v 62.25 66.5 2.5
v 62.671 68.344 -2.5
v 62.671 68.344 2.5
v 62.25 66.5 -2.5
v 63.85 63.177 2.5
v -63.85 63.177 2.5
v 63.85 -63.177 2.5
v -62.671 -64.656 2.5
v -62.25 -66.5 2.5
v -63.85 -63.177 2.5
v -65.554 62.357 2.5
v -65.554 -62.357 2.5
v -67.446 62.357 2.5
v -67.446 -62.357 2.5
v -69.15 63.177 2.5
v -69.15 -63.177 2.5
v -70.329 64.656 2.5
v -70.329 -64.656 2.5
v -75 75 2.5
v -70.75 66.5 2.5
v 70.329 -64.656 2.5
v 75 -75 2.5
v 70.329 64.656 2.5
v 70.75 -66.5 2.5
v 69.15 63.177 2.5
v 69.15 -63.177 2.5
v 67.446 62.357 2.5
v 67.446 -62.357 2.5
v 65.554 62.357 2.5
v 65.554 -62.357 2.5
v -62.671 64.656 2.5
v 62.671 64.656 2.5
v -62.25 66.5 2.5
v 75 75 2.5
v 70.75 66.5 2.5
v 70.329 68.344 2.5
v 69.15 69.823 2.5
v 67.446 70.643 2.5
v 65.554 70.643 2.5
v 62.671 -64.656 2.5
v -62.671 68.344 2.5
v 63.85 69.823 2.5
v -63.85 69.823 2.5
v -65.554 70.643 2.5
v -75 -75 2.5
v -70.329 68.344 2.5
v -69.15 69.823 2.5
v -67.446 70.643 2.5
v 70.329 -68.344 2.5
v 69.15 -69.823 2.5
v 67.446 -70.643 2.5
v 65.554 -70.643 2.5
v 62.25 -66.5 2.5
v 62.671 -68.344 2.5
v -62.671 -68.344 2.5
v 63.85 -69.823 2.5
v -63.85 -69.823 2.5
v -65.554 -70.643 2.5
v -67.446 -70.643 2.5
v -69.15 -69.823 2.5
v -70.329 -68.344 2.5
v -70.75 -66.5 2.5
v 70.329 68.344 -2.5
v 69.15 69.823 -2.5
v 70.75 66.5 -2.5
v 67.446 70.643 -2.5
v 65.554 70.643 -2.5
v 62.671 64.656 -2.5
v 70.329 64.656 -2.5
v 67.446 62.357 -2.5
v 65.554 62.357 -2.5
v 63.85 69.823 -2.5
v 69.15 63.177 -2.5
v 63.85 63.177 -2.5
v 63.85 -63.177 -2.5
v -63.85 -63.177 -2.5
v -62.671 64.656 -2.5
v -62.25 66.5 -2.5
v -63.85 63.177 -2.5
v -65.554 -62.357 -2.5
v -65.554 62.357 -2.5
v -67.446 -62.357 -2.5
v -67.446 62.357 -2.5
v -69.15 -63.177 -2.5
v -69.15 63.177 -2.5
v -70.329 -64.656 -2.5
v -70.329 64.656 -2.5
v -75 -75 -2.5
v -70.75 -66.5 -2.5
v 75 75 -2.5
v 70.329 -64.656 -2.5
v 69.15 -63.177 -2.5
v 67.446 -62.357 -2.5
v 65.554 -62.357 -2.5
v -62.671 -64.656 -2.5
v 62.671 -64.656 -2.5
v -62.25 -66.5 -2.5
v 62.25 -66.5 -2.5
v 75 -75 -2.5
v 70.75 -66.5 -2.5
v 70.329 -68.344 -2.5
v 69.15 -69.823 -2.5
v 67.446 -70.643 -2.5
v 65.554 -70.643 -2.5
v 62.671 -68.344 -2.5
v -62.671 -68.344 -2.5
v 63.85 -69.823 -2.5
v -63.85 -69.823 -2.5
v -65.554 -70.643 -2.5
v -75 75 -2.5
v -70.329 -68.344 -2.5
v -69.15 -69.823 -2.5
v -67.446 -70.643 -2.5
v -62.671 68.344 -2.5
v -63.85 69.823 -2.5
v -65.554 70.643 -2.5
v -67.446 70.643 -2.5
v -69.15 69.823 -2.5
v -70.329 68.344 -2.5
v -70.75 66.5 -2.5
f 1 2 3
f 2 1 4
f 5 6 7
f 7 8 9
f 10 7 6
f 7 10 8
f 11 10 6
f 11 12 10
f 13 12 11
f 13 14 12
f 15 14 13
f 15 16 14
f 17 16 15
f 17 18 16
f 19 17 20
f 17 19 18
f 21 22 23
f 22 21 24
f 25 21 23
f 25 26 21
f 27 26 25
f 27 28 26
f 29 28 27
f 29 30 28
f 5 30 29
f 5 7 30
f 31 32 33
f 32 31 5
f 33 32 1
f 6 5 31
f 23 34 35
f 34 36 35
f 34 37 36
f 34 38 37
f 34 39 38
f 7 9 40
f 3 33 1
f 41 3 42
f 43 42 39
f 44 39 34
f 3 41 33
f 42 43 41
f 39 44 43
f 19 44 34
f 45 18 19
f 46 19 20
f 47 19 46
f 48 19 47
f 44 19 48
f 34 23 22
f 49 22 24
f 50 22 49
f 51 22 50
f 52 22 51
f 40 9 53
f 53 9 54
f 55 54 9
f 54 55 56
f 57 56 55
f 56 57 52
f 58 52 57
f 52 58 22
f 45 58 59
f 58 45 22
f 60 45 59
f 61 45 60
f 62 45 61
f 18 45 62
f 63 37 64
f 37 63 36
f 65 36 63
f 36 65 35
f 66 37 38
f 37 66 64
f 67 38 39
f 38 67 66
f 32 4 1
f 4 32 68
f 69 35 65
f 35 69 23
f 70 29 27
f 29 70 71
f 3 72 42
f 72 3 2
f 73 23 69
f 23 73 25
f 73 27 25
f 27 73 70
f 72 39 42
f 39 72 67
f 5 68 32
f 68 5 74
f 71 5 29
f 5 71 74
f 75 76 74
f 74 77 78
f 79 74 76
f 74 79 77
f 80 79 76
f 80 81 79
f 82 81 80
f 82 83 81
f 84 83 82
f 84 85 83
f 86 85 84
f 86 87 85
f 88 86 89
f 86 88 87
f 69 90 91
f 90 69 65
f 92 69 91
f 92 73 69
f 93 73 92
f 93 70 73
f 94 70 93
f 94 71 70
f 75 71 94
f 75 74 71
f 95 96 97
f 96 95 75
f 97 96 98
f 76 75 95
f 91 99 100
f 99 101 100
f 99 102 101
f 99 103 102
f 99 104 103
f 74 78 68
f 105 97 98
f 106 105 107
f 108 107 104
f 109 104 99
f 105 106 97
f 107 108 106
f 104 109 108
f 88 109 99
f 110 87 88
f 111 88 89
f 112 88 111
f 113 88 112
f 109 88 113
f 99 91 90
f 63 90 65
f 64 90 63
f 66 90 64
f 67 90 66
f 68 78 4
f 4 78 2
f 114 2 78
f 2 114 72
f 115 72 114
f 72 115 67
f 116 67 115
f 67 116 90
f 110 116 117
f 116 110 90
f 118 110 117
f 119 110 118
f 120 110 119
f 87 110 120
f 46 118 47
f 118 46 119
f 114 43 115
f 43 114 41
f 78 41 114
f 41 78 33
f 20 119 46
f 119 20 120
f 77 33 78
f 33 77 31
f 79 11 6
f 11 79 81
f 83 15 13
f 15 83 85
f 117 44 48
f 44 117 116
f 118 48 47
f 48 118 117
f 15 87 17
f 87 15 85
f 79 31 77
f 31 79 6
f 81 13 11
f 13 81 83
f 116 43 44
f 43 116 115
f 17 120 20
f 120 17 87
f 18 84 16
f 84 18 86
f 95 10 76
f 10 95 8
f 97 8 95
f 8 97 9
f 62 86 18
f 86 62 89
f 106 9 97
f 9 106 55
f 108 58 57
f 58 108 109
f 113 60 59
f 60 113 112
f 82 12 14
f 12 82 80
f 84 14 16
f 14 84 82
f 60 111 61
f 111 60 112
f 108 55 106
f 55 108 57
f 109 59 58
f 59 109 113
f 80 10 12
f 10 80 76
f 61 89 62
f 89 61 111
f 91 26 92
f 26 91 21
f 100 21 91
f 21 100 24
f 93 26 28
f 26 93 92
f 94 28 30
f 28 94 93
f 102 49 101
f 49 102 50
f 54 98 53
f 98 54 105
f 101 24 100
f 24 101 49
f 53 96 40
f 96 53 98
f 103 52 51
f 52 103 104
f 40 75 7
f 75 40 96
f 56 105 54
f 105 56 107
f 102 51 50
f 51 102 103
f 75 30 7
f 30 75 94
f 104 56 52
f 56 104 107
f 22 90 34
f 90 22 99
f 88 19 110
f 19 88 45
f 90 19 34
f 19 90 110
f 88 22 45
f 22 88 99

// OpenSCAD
// Generated by SolidPython 1.1.3 on 2024-07-25 13:19:41


difference() {
	cube(center = true, size = [150, 150, 5]);
	union() {
		translate(v = [66.5000000000, 66.5000000000]) {
			cylinder(center = true, h = 5, r = 4.2500000000);
		}
		translate(v = [-66.5000000000, 66.5000000000]) {
			cylinder(center = true, h = 5, r = 4.2500000000);
		}
		translate(v = [-66.5000000000, -66.5000000000]) {
			cylinder(center = true, h = 5, r = 4.2500000000);
		}
		translate(v = [66.5000000000, -66.5000000000]) {
			cylinder(center = true, h = 5, r = 4.2500000000);
		}
	}
}
/***********************************************
*********      SolidPython code:      **********
************************************************
 
import solid
import numpy as np
import numbers
import pudb
from solid.utils import *
import viewscad
import subprocess
import os
import os.path as osp
import math
import sys

chamfer_extrude=solid.import_scad("./chamfer_extrude.scad")
chamfer_extrude=chamfer_extrude.chamfer_extrude
r = viewscad.Renderer(width=800, height=800)

def debug(model,f_name,path="/home/ts/code/projects/mfd/designs/debug"):
    solid.scad_render_to_file(model,osp.join(path,f_name)+".scad")
#generate position list of wells using offset from center
wells_pos_from_center_4 = lambda offset: [[-offset,offset],
                                        [offset, offset],
                                        [-offset, -offset],
                                        [offset, -offset]]
wells_pos_from_center_2 = lambda offset: [[offset,0],
                                        [-offset,0]]

def make_well(dims,shape=None,height=None,dxf=False):
    def circle_cylinder():
        if dxf or (height is None):
            well = solid.circle(r=dims, segments=64)
        else:
            well = solid.cylinder(r=dims, h=height, segments=64, center = True)
        return well
    if dims is None:
        sys.exit("radius needs to be a number")
    if isinstance(dims, numbers.Number):
        well =circle_cylinder()
    elif len(dims)==1:
        if isinstance(dims[1], numbers.Number):
            well =circle_cylinder()
        else:
            sys.exit("radius needs to be a number")
    elif len(dims)==2:
        well = solid.square(dims,center = True)
    elif len(dims)==3:
        well = solid.cube(dims, center = True)
    return well

def wells_top_bottom(center_gap,device_dims=None,shape=None,height=None, positions = None, dxf = False,well_shape=None):
    if well_shape == None:
        well_shape = make_well(device_dims,shape=shape,height=height,dxf=dxf)
    wells = []
    if positions is None:
        offset = radius+radius/2.0
        positions = wells_pos_from_center_2(offset)
    if dxf or (height is None):
        height = 0
    for position in positions:
        if dxf:
            wells.append(solid.translate([position[0],position[1]])(well_shape))
        else:
            wells.append(solid.translate([position[0],position[1],height/2.0])(well_shape))
    return  union()(*wells)

#place wells in four corners 
def four_corner(radius,height=None, positions = None, dxf = False):
    #if well pos not specified set
    #to equally spaced by half radius
    if positions is None:
        offset = radius+radius/2.0
        positions = wells_pos_from_center_4(offset)
    if dxf or (height is None):
        height = 0
    #make wells at positions with specified radius and height
    wells = []
    for position in positions:
        #make circle if making dxf
        if dxf:
            well_shape = solid.circle(r=radius, segments=64)
            well_shape = solid.translate([position[0],position[1]])(well_shape)
        #if stl make cylinder
        else:
            well_shape = solid.cylinder(r=radius, h=height, segments=64, center = True)
            well_shape = solid.translate([position[0],position[1],height/2.0])(well_shape)
        wells.append(well_shape)
    return  union()(*wells)

#generate channels 
def make_channels(length,width,height=0,num_chans=1,max_chans=None,spacing=None, dxf = False,
                  rotate_channels=False):
    if dxf or (height is None):
        height = 0
    #if channel gap not defined, is equal to
    if spacing is None: spacing = width
    #calculate number of channels if fitting max num within given width
    if not max_chans is None:
        import math
        num_chans = math.floor((max_chans-spacing)/(width+spacing))
    #get total width of channel section  
    total_width = (width*num_chans)+(spacing*(num_chans-1))

    #make template channel
    #if rotate_channels: width, length = length, width
    if dxf:
        channel_t = solid.square([length,width],center = True)
    else:
        channel_t = solid.cube([length,width,height], center = True)

    #if number channels is even, offset the first channel to center its gap
    if num_chans % 2 == 0: centering = -(width/2.0+spacing/2.0)
    else: centering = 0
    #move template channel up to align bottom at z = 0 
    #and offset center if necessary
    if dxf:
        channel_t = solid.translate([0,centering])(channel_t)
    else:
        channel_t = solid.translate([0,centering,height/2.0])(channel_t)

    #if rotate_channels: length,width = width,length
    #start making the channels
    channels = []
    for i in range(num_chans):
        #if i=0 there is no translation
        #if i=1, we make the first channel adjacent to second
        direction = i

        #if i>=1, we add channels alternating left and right
        if i >= 1:
            direction = -(i/2.0)
            if i % 2 == 1: direction = (-direction)+0.5
                
        #make channel at right position and add it to channel list
        translation_coords = [0,direction*(width+spacing)]
        #if rotate_channels: translation_coords = [direction*(width+spacing),0]
        if dxf:
            channel = solid.translate(translation_coords)(channel_t)
        else:
            channel = solid.translate([*translation_coords,0])(channel_t)
        channels.append(channel)
    
    #group all channels as one object
    channels = union()(*channels)
    #compute the x,y,z dimensions in order to pass as arguments 
    #for construction of other parts of device (such as the chambers)
    measurements = {'x':(length/2.0,-length/2.0),
                    'y':(total_width/2.0,-total_width/2.0)}
    if not dxf:
        measurements['z'] = (height,0)
    if rotate_channels:
        channels = solid.rotate(90)(channels)
        measurements['x'],measurements['y']=measurements['y'],measurements['x']
    return channels,measurements

def make_chambers(msrs,height=None,extra=0,len_until=None,width=None, dxf = False):
    #computes x,y,z length
    total = lambda x : abs(x[0]) + abs(x[1])
    
    #if specific height if specified
    #otherwise use same height as channels
    if dxf:
        pass
    elif not height is None:
        msrs['z'] = (height,0)
    else:
        msrs['z'] = (0,0)
        
    #make copy of measurements from channels to modify chamber dimensions 
    #and add length to chambers as specified
    chamber_dims = msrs.copy()
    #calculate length of chamber to reach specified offset
    if not len_until is None:
        chamber_len = len_until-(msrs['x'][0])
    #or add specified length to channel length (if not specified, adds 0)
    else:
        chamber_len = msrs['x'][0]+extra
    #set the chamber length based 
    chamber_dims['x'] = (chamber_len/2.0,-(chamber_len/2.0))
    #compute final dimensions of chamber
    if not width is None:
        chamber_dims['y'] = (width/2.0,-width/2.0)
    chamber_dims = [total(size) for size in chamber_dims.values()]
        
    #calculate chamber translation offset to place adjacent to channels
    chamber_trslt = msrs['x'][0]+(chamber_len/2.0)
    #compute chamber translation coordinates to align with channels
    #x = 1 moves chamber above channels
    #x = -1 moves chamber below channels
    if dxf:
        trslt = lambda x : [x*(chamber_trslt),0]
    else:
        trslt = lambda x : [x*(chamber_trslt),0,msrs['z'][0]/2.0]
    
    #function to make chamber at top or at bottom 
    if dxf:
        move = lambda x : solid.translate(trslt(x))(solid.square(chamber_dims, center = True) )
    else:
        move = lambda x : solid.translate(trslt(x))(solid.cube(chamber_dims,center = True))
    #make top and bottom chambers and return them as grouped
    top = move(1)
    bottom = move(-1)
    #chambers=solid.rotate(90)(solid.union()(top,bottom))
    chambers=(solid.union()(top,bottom))

    return chambers

#create alignment features 
def alignment_features(unit,dims,grid_size, mask_size = None, alignment = "hollow", units_from_center = (2.5,2.5), corner_len=None):
    width = grid_size[0]*dims[0]
    length = grid_size[1]*dims[1]
    if mask_size is None and corner_len is None:
        corner_len = (dims[0] + dims[1]) /2 / 8
    corner = lambda thickness_div : solid.union()( solid.square([corner_len,corner_len/thickness_div],center=False), solid.square([corner_len/thickness_div,corner_len],center=False) )
    
    def make_full(thickness_div):
        thickness = corner_len/thickness_div
        tr = solid.translate([0, 0, 0 ])(solid.rotate(180)(corner(thickness_div)))
        tr = solid.translate([thickness/2,thickness/2,0])(tr)
        bl = solid.translate([0, 0, 0 ])(solid.rotate(0)(corner(thickness_div)))
        bl = solid.translate([-thickness/2,-thickness/2,0])(bl)
        return solid.union()(tr,bl)
    
    def make_hollow(thickness_div):
        thickness = corner_len/(thickness_div/2)
        inner = make_full(thickness_div)
        outer = make_full(thickness_div/2)
        hollow = outer - inner 
        return hollow
    
    center = (width /2 , length/2)
    mask_pos = lambda x,y : (center[0] + x*(float(units_from_center[0])*dims[0]), center[1] + y*(float(units_from_center[1])*dims[1]))
    positions = []
    positions.append(mask_pos(1,0))
    positions.append(mask_pos(0,1))
    positions.append(mask_pos(-1,0))
    positions.append(mask_pos(0,-1))
    make_mask = lambda mtype : make_hollow(8) if mtype == "hollow" else make_full(8)
    masks = [ solid.translate([*position,0])(make_mask(alignment)) for position in positions]
    
    solid.scad_render_to_file(solid.union()(*masks),"./designs/open_chamber/masks.scad")
    #return unit - solid.union()(*masks)
    return solid.union()(*masks,unit)

def create_outline(thickness, array, dims, grid_size,):
    width = grid_size[0]*dims[0] + thickness *2
    length = grid_size[1]*dims[1] + thickness *2
    outer = solid.translate([-thickness, -thickness,0])(solid.square([width, length]))
    return outer-array

def create_wall(wall_thickness, outline_thickness, dims, grid_size, wall_height = 2000, dxf = False):
    inner_width = grid_size[0]*dims[0] + outline_thickness *2
    inner_length = grid_size[1]*dims[1] + outline_thickness *2
    outer_width = inner_width + wall_thickness * 2
    outer_length = inner_length + wall_thickness * 2
    outer_pos_x = -outline_thickness-wall_thickness
    outer_pos_y = -outline_thickness-wall_thickness
    inner_pos_x = -outline_thickness
    inner_pos_y = -outline_thickness
    if dxf:
        inner_wall = solid.translate([inner_pos_x,
                                      inner_pos_y,
                                      0])(solid.square([inner_width, inner_length]))
        outer_wall = solid.translate([outer_pos_x,
                                      outer_pos_y,
                                      0])(solid.square([outer_width, outer_length]))

        return outer_wall-inner_wall
    else:
        inner_wall = solid.translate([inner_pos_x,
                                      inner_pos_y,
                                      0])(solid.cube([inner_width, inner_length,wall_height]))
        outer_wall = solid.translate([outer_pos_x,
                                      outer_pos_y,
                                      0])(solid.cube([outer_width, outer_length,wall_height]))

        return outer_wall-inner_wall, {'wall_height': wall_height,
                                       'wall_thickness': wall_thickness,
                                       'inner_width':inner_width,
                                       'inner_length': inner_length,
                                       'outer_width': outer_width,
                                       'outer_length': outer_length,
                                       'outer_pos_x' : outer_pos_x,
                                       'outer_pos_y' : outer_pos_y,
                                       'inner_pos_x' : inner_pos_x,
                                       'inner_pos_y' : inner_pos_y}

def create_thicker_wall(wall_thickness, outer_wall_offset, wall_dims, dims, grid_size, height_start = .2, height_end=2, dxf = False):
    addon_wall,thicker_wall_dims = create_wall(wall_thickness, outer_wall_offset, dims, grid_size, wall_height=height_end-height_start, dxf = False)
    addon_wall = solid.translate([0,0,height_start])(addon_wall)

    thicker_wall_dims['wall_height'] = height_end
    thicker_wall_dims['wall_thickness'] = wall_dims['wall_thickness'] + wall_thickness
    return addon_wall, thicker_wall_dims
 
def add_lock_to_wall(wall,wall_dims,y_offset = 0,cut_ratio=0.7,L_length=3, gap_ratio=0.05, axis="x",width_ratio=1/2):
    # Makes L shape
    def make_L(max_length,length_thickness,max_width,width_thickness,height,y_offset):
        length = solid.cube([max_length,length_thickness,height])
        width = solid.cube([width_thickness,max_width,height])
        width = solid.translate([max_length-(width_thickness),0,0])(width)
        L = solid.union()(width,length)
        debug(L,"L")
        if axis == "x":
            L = solid.rotate(-90)(L)
            L = solid.translate([0,max_length,0])(L)
        else:
            L = solid.rotate(-180)(L)
            L = solid.translate([max_length,max_width,0])(L)
        return solid.translate([0,0,y_offset])(L)
    
    lock_length = L_length
    lock_width = wall_dims['wall_thickness']*width_ratio
    lock_length_thickness = lock_width/2
    lock_width_thickness = lock_width/2
    L_lock = make_L(lock_length,lock_length_thickness,lock_width,lock_width_thickness, wall_dims['wall_height']-y_offset, y_offset)
    
    margin_space = lock_length - lock_length*(1-gap_ratio)
    key_length = lock_length-margin_space
    key_length_thickness = lock_length_thickness-(margin_space*2)
    key_width = lock_width-(margin_space*2)
    key_width_thickness = lock_width_thickness-(margin_space*2)
    L_key = make_L(key_length,key_length_thickness,key_width,key_width_thickness, wall_dims['wall_height']-y_offset, y_offset)
    L_key = solid.translate([margin_space,margin_space,0])(L_key)
    L = solid.union()(L_lock,L_key)
    debug(L,"L")
    
    #Make cube to be used as negative to split frame in a half
    #Can choose if making left or right negative, specify ratio of split
    def make_negative(right,cut_ratio):
        if axis == "x":
            if right:
                length = wall_dims['outer_length']*(1-cut_ratio)
                pos_x = wall_dims['outer_pos_x']+(wall_dims['outer_length']*cut_ratio)
            else:
                length = wall_dims['outer_length']*(cut_ratio)
                pos_x = wall_dims['outer_pos_x'] 
            negative = solid.cube([wall_dims['outer_width'],length, wall_dims['wall_height']])
            negative = solid.translate([wall_dims['outer_pos_y'],pos_x,0])(negative)
        else:
            if right:
                length = wall_dims['outer_width']*(1-cut_ratio)
                pos_x = wall_dims['outer_pos_y']+(wall_dims['outer_width']*cut_ratio)
            else:
                length = wall_dims['outer_width']*(cut_ratio)
                pos_x = wall_dims['outer_pos_y'] 
            negative = solid.cube([length,wall_dims['outer_length'], wall_dims['wall_height']])
            negative = solid.translate([pos_x,wall_dims['outer_pos_x'],0])(negative)
        return negative, pos_x, length 
                      
    #Make negatives
    negative_right, right_half_pos_x, right_half_length = make_negative(True,cut_ratio)
    negative_left, left_half_pos_x, right_half_length = make_negative(False,cut_ratio)
    #Make halves
    left_half = solid.difference()(wall,negative_right)
    right_half = solid.difference()(wall,negative_left)
    def place_L(L, L_length,L_width):
        #Place L on top wall       
        offset_to_center = (wall_dims['wall_thickness']-L_width)/2
        if axis == "x":
            y_pos_top = (wall_dims['outer_pos_y'] +
                    wall_dims['outer_width'] - 
                    L_width - offset_to_center)
            top_L = solid.translate([y_pos_top,
                                     right_half_pos_x-(L_length),
                                     0])(L)
            #Place L on bottom wall       
            y_pos_bottom = wall_dims['outer_pos_y']+offset_to_center
            bottom_L = solid.translate([y_pos_bottom,
                                        right_half_pos_x-L_length,
                                        0])(L)
        else:
            y_pos_top = (wall_dims['outer_pos_x'] +
                    wall_dims['outer_length'] -
                    (L_width+offset_to_center))
            top_L = solid.translate([right_half_pos_x-L_length,
                                     y_pos_top,
                                     0])(L)
            #Place L on bottom wall       
            y_pos_bottom = wall_dims['outer_pos_y']+offset_to_center
            bottom_L = solid.translate([right_half_pos_x-L_length,
                                        y_pos_bottom,
                                        0])(L)
        return bottom_L, top_L
    #Make complimentary L pieces through union and differences
    #Make Lock
    bottom_L_lock, top_L_lock = place_L(L_lock,L_length,lock_width)
    left_half = solid.difference()(left_half,bottom_L_lock)
    left_half = solid.difference()(left_half,top_L_lock)
    #Make Key
    bottom_L_key, top_L_key = place_L(L_key,L_length,lock_width)
    right_half = solid.union()(right_half,bottom_L_key)
    right_half = solid.union()(right_half,top_L_key)
    return left_half, right_half


#build a row x col grid of containment units
def make_unit_array(unit,dims,grid_size, dxf = False, alignment = None, mask_size = None,
                    units_from_center = None,alignment_offset=None, alignment_mark_size=1):
    units = []
    for col in range(grid_size[1]):
        for row in range(grid_size[0]):
            if dxf:
                units.append(solid.translate([row*dims[0],col*dims[1]])(unit))
            else:
                units.append(solid.translate([row*dims[0],col*dims[1],dims[2]/2.0])(unit))
    array = solid.union()(*units)
    if (not alignment is None) and dxf:
        if not alignment_offset is None:
            array = solid.translate([alignment_offset[0],alignment_offset[1]])(array)
        array = alignment_features(array,dims, grid_size, alignment = alignment, mask_size = None, units_from_center = units_from_center,corner_len=alignment_mark_size)
        if not alignment_offset is None:
            array = solid.translate([-alignment_offset[0],-alignment_offset[1]])(array)
    return array


def make_taylor(wells_pos = wells_pos_from_center_4(2.25), well_rad = 1.5 ,
                well_height = 2, chan_w = 0.01, chan_l = 1, chan_h = 0.010 ,
                chan_gap = 0.040, max_chans = None,num_chans=100, chamber_height  = 0.100,
                columns = 1, rows = 1, chamber_len_until=2.25, add_channels = True, add_wells = True, 
                add_chambers = True, save_path = "./", alignment = None, units_from_center = 2,
                mask_size = None, render_stl = False, outline_thickness = 0.050, dxf = True,
                wall_height = 15, wall_thickness = 0.95, casing_x=9, casing_y=9, casing_z=0,rotate_units=0):

    dims = [casing_x, casing_y, casing_z]
    wells = four_corner(well_rad,well_height, dxf = dxf, positions = wells_pos)
    debug(wells,"wells")
    channels, msrs = make_channels(chan_l,chan_w,chan_h,dxf=dxf, spacing = chan_gap, max_chans=max_chans,num_chans=num_chans)
    debug(channels,"channels")
    chambers = make_chambers(msrs,dxf = dxf, height=chamber_height,len_until=chamber_len_until)
    debug(chambers,"chambers")

    #add together and render
    device_parts = []
    if add_channels:
        device_parts.append(channels)
    if add_wells:
        device_parts.append(wells)
    if add_chambers:
        device_parts.append(chambers)
    device=union()(*device_parts)
    device = rotate(rotate_units)(device)

    device=solid.translate([dims[0]/2.0,dims[1]/2.0,0])(device)
    channels = rotate(rotate_units)(channels)
    channels=solid.translate([dims[0]/2,dims[1]/2,0])(channels)
    chambers_wells = union()(wells,chambers)
    chambers_wells = rotate(rotate_units)(chambers_wells)
    chambers_wells=solid.translate([dims[0]/2,dims[1]/2,0])(chambers_wells)

    file_name = str(rows)+'x'+str(columns)+'_units_'
    grid_size = [rows,columns]

    if alignment:
        alignment="full"
    device = make_unit_array(device,dims,grid_size, dxf=dxf, alignment = alignment,
                                 units_from_center = units_from_center)
    channels = make_unit_array(channels,dims,grid_size, dxf=dxf, alignment = alignment,
                                 units_from_center = units_from_center)
    if alignment=="full":
        alignment="hollow"

    chambers_wells = make_unit_array(chambers_wells,dims,grid_size, dxf=dxf, alignment = alignment,
                                 units_from_center =units_from_center)

    def save_model(model,prefix):
        model_fname = os.path.abspath(save_path+prefix+"_"+file_name+".scad")
        solid.scad_render_to_file(model,model_fname)
        return model_fname

    wells_fname = save_model(wells,"wells")
    channels_fname = save_model(channels,"channels")
    device_fname = save_model(device,"device")
    chambers_wells_fname = save_model(chambers_wells,"chambers_wells")
    return (chambers_wells,chambers_wells_fname), (channels,channels_fname), (device,device_fname)

def make_device(design='open',rows=8,columns=6,wells_pos = 4.5,well_offset=3.2, well_rad=3.2,well_height=0.1,
                chan_l=1,chan_w=0.01,chan_h=0.01,chan_gap=0.015,num_chans=101,dxf=True,save_path="./designs/open_chamber/",
                casing_x=9.0,casing_y=18.0,casing_z=0,rotate_units=90,units_from_center=(3,1),chamber_len_until=4.5,
                chamber_width=None,alignment=True, add_wells=True, add_channels=True,add_chambers=True,well_shape=None):

    dims = [casing_x, casing_y, casing_z]
    if design == "open":
        wells_pos=wells_pos_from_center_2(wells_pos)
        wells = wells_top_bottom(well_offset*2,device_dims=well_rad,height=well_height, dxf = dxf, positions = wells_pos,well_shape=well_shape)
    elif design == "closed":
        wells_pos=wells_pos_from_center_4(wells_pos)
        debug(wells,"wells")
        wells = four_corner(well_offset,well_height,device_dims=well_rad, dxf = dxf, positions = wells_pos)
    else:
        print(design+" is not a valid design.\n Choose valid design: 'open' or 'closed'")
        exit()
    wells = rotate(rotate_units)(wells)
    wells=solid.translate([dims[0]/2,dims[1]/2,0])(wells)
    debug(wells,"wells")

    channels, msrs = make_channels(chan_l,chan_w,chan_h,dxf=dxf, spacing = chan_gap, num_chans=num_chans,rotate_channels=False)
    channels = rotate(rotate_units)(channels)
    channels=solid.translate([dims[0]/2,dims[1]/2,0])(channels)

    chambers=make_chambers(msrs,height=None,extra=0,len_until=chamber_len_until, width=chamber_width,dxf = dxf)
    chambers = rotate(rotate_units)(chambers)
    chambers=solid.translate([dims[0]/2,dims[1]/2,0])(chambers)

    device_parts = []
    if add_channels:
        device_parts.append(channels)
    if add_wells:
        device_parts.append(wells)
    if add_chambers:
        device_parts.append(chambers)
    device = union()(*device_parts)
    #device = rotate(rotate_units)(device)
    #device=solid.translate([dims[0]/2.0,dims[1]/2.0,0])(device)

    chambers_wells = []
    if add_chambers:
        chambers_wells.append(chambers)
    if add_wells:
        chambers_wells.append(wells)
    chambers_wells = union()(*chambers_wells)
    #chambers_wells = union()(wells,chambers)
    #chambers_wells = rotate(rotate_units)(chambers_wells)
    #chambers_wells=solid.translate([dims[0]/2,dims[1]/2,0])(chambers_wells)

    file_name = str(rows)+'x'+str(columns)+'_units_'

    grid_size = [rows,columns]
    if alignment:
        alignment="full"
    device = make_unit_array(device,dims,grid_size, dxf=dxf, alignment = alignment,
                                 units_from_center = units_from_center)
    channels = make_unit_array(channels,dims,grid_size, dxf=dxf, alignment = alignment,
                                 units_from_center = units_from_center)
    if alignment=="full":
        alignment="hollow"

    chambers_wells = make_unit_array(chambers_wells,dims,grid_size, dxf=dxf, alignment = alignment,
                                 units_from_center =units_from_center)

    def save_model(model,prefix):
        model_fname = os.path.abspath(save_path+prefix+"_"+file_name+".scad")
        solid.scad_render_to_file(model,model_fname)
        return model_fname

    wells_fname = save_model(wells,"wells")
    channels_fname = save_model(channels,"channels")
    device_fname = save_model(device,"device")
    chambers_wells_fname = save_model(chambers_wells,"chambers_wells")
    return (chambers_wells,chambers_wells_fname), (channels,channels_fname), (device,device_fname)


def make_open_chamber(rows=8,columns=6,wells_pos = wells_pos_from_center_2(4.5), well_rad=3.2,well_height=0.1,
                      chan_l=1,chan_w=0.01,chan_h=0.01,chan_gap=0.015,num_chans=101,dxf=True,save_path="./designs/open_chamber/",
                      casing_x=9.0,casing_y=18.0,casing_z=0,rotate_units=90,units_from_center=(3,1),chamber_len_until=4.5,
                      chamber_width=None,alignment=True, add_wells=True, add_channels=True,add_chambers=True,well_shape=None):

    dims = [casing_x, casing_y, casing_z]
    wells = wells_top_bottom(well_rad,height=well_height, dxf = dxf, positions = wells_pos, well_shape=well_shape)
    channels, msrs = make_channels(chan_l,chan_w,chan_h,dxf=dxf, spacing = chan_gap, num_chans=num_chans,rotate_channels=False)
    chambers=make_chambers(msrs,height=None,extra=0,len_until=chamber_len_until, width=chamber_width,dxf = dxf)
    debug(chambers,"chambers")
    device_parts = []
    if add_channels:
        device_parts.append(channels)
    if add_wells:
        device_parts.append(wells)
    if add_chambers:
        device_parts.append(chambers)
    device = union()(*device_parts)
    device = rotate(rotate_units)(device)
    device=solid.translate([dims[0]/2.0,dims[1]/2.0,0])(device)
    channels = rotate(rotate_units)(channels)
    channels=solid.translate([dims[0]/2,dims[1]/2,0])(channels)
    chambers_wells = union()(wells,chambers)
    chambers_wells = rotate(rotate_units)(chambers_wells)
    chambers_wells=solid.translate([dims[0]/2,dims[1]/2,0])(chambers_wells)

    file_name = str(rows)+'x'+str(columns)+'_units_'

    grid_size = [rows,columns]
    if alignment:
        alignment="full"
    device = make_unit_array(device,dims,grid_size, dxf=dxf, alignment = alignment,
                                 units_from_center = units_from_center)
    channels = make_unit_array(channels,dims,grid_size, dxf=dxf, alignment = alignment,
                                 units_from_center = units_from_center)
    if alignment=="full":
        alignment="hollow"

    chambers_wells = make_unit_array(chambers_wells,dims,grid_size, dxf=dxf, alignment = alignment,
                                 units_from_center =units_from_center)

    def save_model(model,prefix):
        model_fname = os.path.abspath(save_path+prefix+"_"+file_name+".scad")
        solid.scad_render_to_file(model,model_fname)
        return model_fname

    wells_fname = save_model(wells,"wells")
    channels_fname = save_model(channels,"channels")
    device_fname = save_model(device,"device")
    chambers_wells_fname = save_model(chambers_wells,"chambers_wells")
    return (chambers_wells,chambers_wells_fname), (channels,channels_fname), (device,device_fname)

def to_dxf(scad_path):
    dxf_path = scad_path.replace(".scad",".dxf")
    subprocess.call(["openscad", "-o", dxf_path, scad_path])
    import ezdxf
    temp_dxf = ezdxf.readfile(dxf_path)
    temp_dxf.saveas(dxf_path)

#def make_walls(diameter,thickness,grid_size,dims,height=20,segments=256,make_inner=True):
#    wafer_wall_out = solid.cylinder(r=diameter/2,h=height, segments=segments)
#    wafer_wall_in = solid.cylinder(r=(diameter/2-thickness),h=height, segments=segments)
#    wafer_wall = solid.difference()(wafer_wall_out,wafer_wall_in)
#    wafer_wall = solid.translate([grid_size[1]*dims[1]/2.0,grid_size[0]*dims[0]/2.0])(wafer_wall)
#
#    vertical_wall_length = grid_size[1]*dims[1]
#    horizontal_wall_length = grid_size[0]*dims[0]
#    vertical_wall = solid.cube([vertical_wall_length,thickness,height],center = True)
#    vertical_wall = solid.translate([vertical_wall_length/2,0,height/2])(vertical_wall)
#    horizontal_wall = solid.cube([thickness,horizontal_wall_length,height],center = True)
#    horizontal_wall = solid.translate([0,vertical_wall_length/2,height/2])(horizontal_wall)
#    walls = []
#    walls.append(horizontal_wall)
#    walls.append(vertical_wall)
#    for col in range(grid_size[1]):
#        if col == grid_size[1]-1: 
#            walls.append(solid.translate([0,(col+1)*dims[1]])(vertical_wall))
#        elif col > 0 and col < grid_size[1]-1 and make_inner==True:
#            walls.append(solid.translate([0,(col+1)*dims[1]])(vertical_wall))
#    for row in range(grid_size[0]):
#        if row == grid_size[0]-1: 
#            walls.append(solid.translate([(row+1)*dims[0],0])(horizontal_wall))
#        elif row > 0 and row < grid_size[0]-1 and make_inner==True:
#            walls.append(solid.translate([(row+1)*dims[0],0])(horizontal_wall))
#    walls = union()(*walls)
#    wafer_walls = union()(walls,wafer_wall)
#    return walls,wafer_wall,wafer_walls

def make_walls(diameter,thickness,grid_size,dims,height=20,segments=256,make_inner=True,padx=0,pady=0):
    wafer_wall_out = solid.cylinder(r=diameter/2,h=height, segments=segments)
    wafer_wall_in = solid.cylinder(r=(diameter/2-thickness),h=height, segments=segments)
    wafer_wall = solid.difference()(wafer_wall_out,wafer_wall_in)
    wafer_wall = solid.translate([grid_size[1]*dims[1]/2.0,grid_size[0]*dims[0]/2.0])(wafer_wall)

    vertical_wall_length = grid_size[0]*dims[0]+padx
    horizontal_wall_length = grid_size[1]*dims[1]+pady
    vertical_wall = solid.cube([vertical_wall_length,thickness,height],center = True)
    vertical_wall = solid.translate([vertical_wall_length/2-pady/2,-padx/2,height/2])(vertical_wall)
    horizontal_wall = solid.cube([thickness,horizontal_wall_length,height],center = True)
    horizontal_wall = solid.translate([-pady/2,horizontal_wall_length/2-padx/2,height/2])(horizontal_wall)
    walls = []
    walls.append(horizontal_wall)
    walls.append(vertical_wall)
    for col in range(grid_size[1]):
        if col == grid_size[1]-1: 
            walls.append(solid.translate([0,(col+1)*dims[1]+pady])(vertical_wall))
        elif col > 0 and col < grid_size[1]-1 and make_inner==True:
            walls.append(solid.translate([0,(col+1)*dims[1]])(vertical_wall))
    for row in range(grid_size[0]):
        if row == grid_size[0]-1: 
            walls.append(solid.translate([(row+1)*dims[0]+padx,0])(horizontal_wall))
        elif row > 0 and row < grid_size[0]-1 and make_inner==True:
            walls.append(solid.translate([(row+1)*dims[0],0])(horizontal_wall))
    walls = union()(*walls)
    wafer_walls = union()(walls,wafer_wall)
    return walls,wafer_wall,wafer_walls

def save_model(model,base_path,base_name,dxf=True):
    if not os.path.exists(base_path):
        os.makedirs(base_path)
    dxf_path=osp.join(base_path,base_name+".scad")
    solid.scad_render_to_file(model,osp.join(dxf_path))
    if dxf:
        to_dxf(dxf_path)

def make_wafer(diameter,flat_len,thickness):
    wafer = solid.cylinder(r1=diameter/2,r2=diameter/2,h=thickness,segments=512,)()
    x_start_flat=(flat_len/2)
    y_start_flat = math.sqrt(((diameter/2)**2) - (x_start_flat**2) )
    height_delete_flat=diameter/2-y_start_flat
    flat_delete = solid.cube([flat_len,height_delete_flat,thickness],center=False)()
    flat_delete = solid.translate([-flat_len/2,y_start_flat,0])(flat_delete)
    wafer = solid.difference()(wafer,flat_delete)
    wafer = solid.rotate(90)(wafer)
    return wafer

def add_wafer_to_mask(wafer_size,flat_len,mask,grid_size,dims,wafer_line_thickness=0.1,outer_mask_thickness=5,alignment_offset=None,shrinkage_scale=1.0):
    def make_wafer_mask(wafer_size,flat_len):
        wafer_mask = make_wafer(wafer_size,flat_len,1)
        wafer_mask = solid.projection()(wafer_mask)
        wafer_mask = solid.translate(np.array([grid_size[0]*dims[0]/2.0,grid_size[1]*dims[1]/2.0])*shrinkage_scale)(wafer_mask)
        if not alignment_offset is None:
            wafer_mask = solid.translate(np.array([-alignment_offset[0],-alignment_offset[1]])*shrinkage_scale)(wafer_mask)
        return wafer_mask

    inner_wafer_line_mask = make_wafer_mask(wafer_size-wafer_line_thickness/2,flat_len)
    outer_wafer_line_mask = make_wafer_mask(wafer_size+wafer_line_thickness/2,flat_len)
    outer_wafer_mask = make_wafer_mask(wafer_size+outer_mask_thickness,flat_len)
    outer_wafer_mask = solid.difference()(outer_wafer_mask,outer_wafer_line_mask)
    wafer_mask = solid.union()(outer_wafer_mask,inner_wafer_line_mask)

    return solid.difference()(wafer_mask,mask)

def make_posts(post_shape,post_height):
    posts = solid.linear_extrude(height=post_height)(post_shape)
    return posts

def make_wafer_empty(diameter,flat_len,thickness,margin,notch_len=20,notch_height=5,oversize=1.01):
    diameter*=oversize
    flat_len*=oversize
    wafer = make_wafer(diameter,flat_len,thickness)
    holder = solid.cylinder(r1=diameter/2+margin,r2=diameter/2+margin,h=thickness,segments=512)()
    holder = solid.difference()(holder,wafer)

    x_start_flat=(flat_len/2)
    y_start_flat = math.sqrt(((diameter/2)**2) - (x_start_flat**2) )
    height_delete_flat=diameter/2-y_start_flat
    notch = solid.cube([notch_len,notch_height,thickness],center=False)()
    notch = solid.translate([-notch_len/2,y_start_flat,0])(notch)
    notch = solid.rotate(90)(notch)
    return solid.difference()(holder,notch)

def wafer_print_calibration(diameter,thickness,height,z_offset):
    circles = []
    radii = []
    radii.append(diameter/2.0*0.8)
    radii.append(diameter/2.0*0.6)
    radii.append(diameter/2.0*0.4)
    radii.append(diameter/2.0*0.2)
    for radius in radii:
        inner = solid.cylinder(r1=radius-(thickness/2.0),r2=radius-(thickness/2.0),h=thickness,segments=512,)()
        outer = solid.cylinder(r1=radius+(thickness/2.0),r2=radius+(thickness/2.0),h=thickness,segments=512,)()
        diff = solid.difference()(outer,inner)
        circles.append(diff)
    circles = solid.union()(*circles)
    circles = solid.translate([0,0,z_offset])(circles)
    return circles

def make_rack(wells,dims,grid_size,alignment_offset,rack_x,rack_y,rack_thickness,bolt_width,add_bolts=True):

    #get X and Y dimensions of gride of pipette tips
    X_len = dims[0]*grid_size[0]
    Y_len = dims[1]*grid_size[1]
    #make rack
    rack = solid.cube([rack_x,rack_y,rack_thickness],center=True)

    if add_bolts:
    #add bolt holes
        bolt_hole=solid.cylinder(r=bolt_width/2,h=rack_thickness,center=True)()
        bolt_holes = []
        bolt_holes.append(solid.translate([rack_x/2-1.5*bolt_width,rack_y/2-1.5*bolt_width])(bolt_hole))
        bolt_holes.append(solid.translate([-rack_x/2+1.5*bolt_width,rack_y/2-1.5*bolt_width])(bolt_hole))
        bolt_holes.append(solid.translate([-rack_x/2+1.5*bolt_width,-rack_y/2+1.5*bolt_width])(bolt_hole))
        bolt_holes.append(solid.translate([rack_x/2-1.5*bolt_width,-rack_y/2+1.5*bolt_width])(bolt_hole))
        bolt_holes = solid.union()(*bolt_holes)
        rack=solid.difference()(rack,bolt_holes)
    rack_support = rack

    #center rack with pipette holes
    rack = solid.translate([0,0,rack_thickness/2])(rack)
    rack = solid.translate([X_len/2,Y_len/2])(rack)
    rack = solid.translate([-alignment_offset[0],-alignment_offset[1]])(rack)
    wells = solid.linear_extrude(height=rack_thickness)(wells)
    rack = solid.difference()(rack,wells)
    return rack, rack_support

def make_pillar(wells,dims,grid_size,alignment_offset,rack_x,rack_y,pillar_height,rack_thickness,bolt_width,add_bolts=True,taper_angle=1,bolt_position_corner=1.5):

    #get X and Y dimensions of gride of pipette tips
    X_len = dims[0]*grid_size[0]
    Y_len = dims[1]*grid_size[1]
    #make rack
    rack = solid.cube([rack_x,rack_y,rack_thickness],center=True)
    
    if add_bolts:
    #add bolt holes
        bolt_hole=solid.cylinder(r=bolt_width/2,h=rack_thickness,center=True)()
        bolt_holes = []
        bolt_holes.append(solid.translate([rack_x/2-bolt_position_corner*bolt_width,rack_y/2-bolt_position_corner*bolt_width])(bolt_hole))
        bolt_holes.append(solid.translate([-rack_x/2+bolt_position_corner*bolt_width,rack_y/2-bolt_position_corner*bolt_width])(bolt_hole))
        bolt_holes.append(solid.translate([-rack_x/2+bolt_position_corner*bolt_width,-rack_y/2+bolt_position_corner*bolt_width])(bolt_hole))
        bolt_holes.append(solid.translate([rack_x/2-bolt_position_corner*bolt_width,-rack_y/2+bolt_position_corner*bolt_width])(bolt_hole))
        bolt_holes = solid.union()(*bolt_holes)
        rack=solid.difference()(rack,bolt_holes)
    rack_support = rack

    #center rack with pipette holes
    #rack = solid.translate([0,0,-rack_thickness])(rack)
    rack = solid.translate([X_len/2,Y_len/2])(rack)
    rack = solid.translate([-alignment_offset[0],-alignment_offset[1]])(rack)
    if not taper_angle == 0:
        wells=chamfer_extrude(pillar_height,taper_angle,segments=20)(wells)
    else:
        wells = solid.linear_extrude(height=pillar_height)(wells)
    rack = solid.union()(rack,wells)
    return rack, rack_support

def deg_taper_len(height,deg):
    if not deg == 0:
        return height*math.tan(math.radians(deg))
    else:
        return 0

def make_outline(inner_dims,wall_thickness,grid_size,dims,alignment_offset):
    inner_dims=np.array(inner_dims)
    inner_outline=solid.square(inner_dims,center=True)
    outer_dims=inner_dims+wall_thickness
    outer_outline=solid.square(outer_dims,center=True)
    outline=solid.difference()(outer_outline,inner_outline)
    outline=solid.translate([grid_size[0]*dims[0]/2.0,grid_size[1]*dims[1]/2.0])(outline)
    return outline

def scale_percent_pdms_heat_shrinkage(temperature):
    scale_percent=1
    if type(temperature) in (int,float):
        if 40 <= temperature <= 150:
            shrinkage = 0.0180*temperature + 0.46
            scale_percent=1+shrinkage/100.0
        else:
            temperature = None
    else:
        temperature = None
    if not temperature is None:
        text="Cure @ "+str(temperature)+"°C, "+str(scale_percent)+"% oversize compensating for shrinkage"
    else: text="Cure @ room temperature, no shrinkage compensation"
    return scale_percent,text









 
 
************************************************/
